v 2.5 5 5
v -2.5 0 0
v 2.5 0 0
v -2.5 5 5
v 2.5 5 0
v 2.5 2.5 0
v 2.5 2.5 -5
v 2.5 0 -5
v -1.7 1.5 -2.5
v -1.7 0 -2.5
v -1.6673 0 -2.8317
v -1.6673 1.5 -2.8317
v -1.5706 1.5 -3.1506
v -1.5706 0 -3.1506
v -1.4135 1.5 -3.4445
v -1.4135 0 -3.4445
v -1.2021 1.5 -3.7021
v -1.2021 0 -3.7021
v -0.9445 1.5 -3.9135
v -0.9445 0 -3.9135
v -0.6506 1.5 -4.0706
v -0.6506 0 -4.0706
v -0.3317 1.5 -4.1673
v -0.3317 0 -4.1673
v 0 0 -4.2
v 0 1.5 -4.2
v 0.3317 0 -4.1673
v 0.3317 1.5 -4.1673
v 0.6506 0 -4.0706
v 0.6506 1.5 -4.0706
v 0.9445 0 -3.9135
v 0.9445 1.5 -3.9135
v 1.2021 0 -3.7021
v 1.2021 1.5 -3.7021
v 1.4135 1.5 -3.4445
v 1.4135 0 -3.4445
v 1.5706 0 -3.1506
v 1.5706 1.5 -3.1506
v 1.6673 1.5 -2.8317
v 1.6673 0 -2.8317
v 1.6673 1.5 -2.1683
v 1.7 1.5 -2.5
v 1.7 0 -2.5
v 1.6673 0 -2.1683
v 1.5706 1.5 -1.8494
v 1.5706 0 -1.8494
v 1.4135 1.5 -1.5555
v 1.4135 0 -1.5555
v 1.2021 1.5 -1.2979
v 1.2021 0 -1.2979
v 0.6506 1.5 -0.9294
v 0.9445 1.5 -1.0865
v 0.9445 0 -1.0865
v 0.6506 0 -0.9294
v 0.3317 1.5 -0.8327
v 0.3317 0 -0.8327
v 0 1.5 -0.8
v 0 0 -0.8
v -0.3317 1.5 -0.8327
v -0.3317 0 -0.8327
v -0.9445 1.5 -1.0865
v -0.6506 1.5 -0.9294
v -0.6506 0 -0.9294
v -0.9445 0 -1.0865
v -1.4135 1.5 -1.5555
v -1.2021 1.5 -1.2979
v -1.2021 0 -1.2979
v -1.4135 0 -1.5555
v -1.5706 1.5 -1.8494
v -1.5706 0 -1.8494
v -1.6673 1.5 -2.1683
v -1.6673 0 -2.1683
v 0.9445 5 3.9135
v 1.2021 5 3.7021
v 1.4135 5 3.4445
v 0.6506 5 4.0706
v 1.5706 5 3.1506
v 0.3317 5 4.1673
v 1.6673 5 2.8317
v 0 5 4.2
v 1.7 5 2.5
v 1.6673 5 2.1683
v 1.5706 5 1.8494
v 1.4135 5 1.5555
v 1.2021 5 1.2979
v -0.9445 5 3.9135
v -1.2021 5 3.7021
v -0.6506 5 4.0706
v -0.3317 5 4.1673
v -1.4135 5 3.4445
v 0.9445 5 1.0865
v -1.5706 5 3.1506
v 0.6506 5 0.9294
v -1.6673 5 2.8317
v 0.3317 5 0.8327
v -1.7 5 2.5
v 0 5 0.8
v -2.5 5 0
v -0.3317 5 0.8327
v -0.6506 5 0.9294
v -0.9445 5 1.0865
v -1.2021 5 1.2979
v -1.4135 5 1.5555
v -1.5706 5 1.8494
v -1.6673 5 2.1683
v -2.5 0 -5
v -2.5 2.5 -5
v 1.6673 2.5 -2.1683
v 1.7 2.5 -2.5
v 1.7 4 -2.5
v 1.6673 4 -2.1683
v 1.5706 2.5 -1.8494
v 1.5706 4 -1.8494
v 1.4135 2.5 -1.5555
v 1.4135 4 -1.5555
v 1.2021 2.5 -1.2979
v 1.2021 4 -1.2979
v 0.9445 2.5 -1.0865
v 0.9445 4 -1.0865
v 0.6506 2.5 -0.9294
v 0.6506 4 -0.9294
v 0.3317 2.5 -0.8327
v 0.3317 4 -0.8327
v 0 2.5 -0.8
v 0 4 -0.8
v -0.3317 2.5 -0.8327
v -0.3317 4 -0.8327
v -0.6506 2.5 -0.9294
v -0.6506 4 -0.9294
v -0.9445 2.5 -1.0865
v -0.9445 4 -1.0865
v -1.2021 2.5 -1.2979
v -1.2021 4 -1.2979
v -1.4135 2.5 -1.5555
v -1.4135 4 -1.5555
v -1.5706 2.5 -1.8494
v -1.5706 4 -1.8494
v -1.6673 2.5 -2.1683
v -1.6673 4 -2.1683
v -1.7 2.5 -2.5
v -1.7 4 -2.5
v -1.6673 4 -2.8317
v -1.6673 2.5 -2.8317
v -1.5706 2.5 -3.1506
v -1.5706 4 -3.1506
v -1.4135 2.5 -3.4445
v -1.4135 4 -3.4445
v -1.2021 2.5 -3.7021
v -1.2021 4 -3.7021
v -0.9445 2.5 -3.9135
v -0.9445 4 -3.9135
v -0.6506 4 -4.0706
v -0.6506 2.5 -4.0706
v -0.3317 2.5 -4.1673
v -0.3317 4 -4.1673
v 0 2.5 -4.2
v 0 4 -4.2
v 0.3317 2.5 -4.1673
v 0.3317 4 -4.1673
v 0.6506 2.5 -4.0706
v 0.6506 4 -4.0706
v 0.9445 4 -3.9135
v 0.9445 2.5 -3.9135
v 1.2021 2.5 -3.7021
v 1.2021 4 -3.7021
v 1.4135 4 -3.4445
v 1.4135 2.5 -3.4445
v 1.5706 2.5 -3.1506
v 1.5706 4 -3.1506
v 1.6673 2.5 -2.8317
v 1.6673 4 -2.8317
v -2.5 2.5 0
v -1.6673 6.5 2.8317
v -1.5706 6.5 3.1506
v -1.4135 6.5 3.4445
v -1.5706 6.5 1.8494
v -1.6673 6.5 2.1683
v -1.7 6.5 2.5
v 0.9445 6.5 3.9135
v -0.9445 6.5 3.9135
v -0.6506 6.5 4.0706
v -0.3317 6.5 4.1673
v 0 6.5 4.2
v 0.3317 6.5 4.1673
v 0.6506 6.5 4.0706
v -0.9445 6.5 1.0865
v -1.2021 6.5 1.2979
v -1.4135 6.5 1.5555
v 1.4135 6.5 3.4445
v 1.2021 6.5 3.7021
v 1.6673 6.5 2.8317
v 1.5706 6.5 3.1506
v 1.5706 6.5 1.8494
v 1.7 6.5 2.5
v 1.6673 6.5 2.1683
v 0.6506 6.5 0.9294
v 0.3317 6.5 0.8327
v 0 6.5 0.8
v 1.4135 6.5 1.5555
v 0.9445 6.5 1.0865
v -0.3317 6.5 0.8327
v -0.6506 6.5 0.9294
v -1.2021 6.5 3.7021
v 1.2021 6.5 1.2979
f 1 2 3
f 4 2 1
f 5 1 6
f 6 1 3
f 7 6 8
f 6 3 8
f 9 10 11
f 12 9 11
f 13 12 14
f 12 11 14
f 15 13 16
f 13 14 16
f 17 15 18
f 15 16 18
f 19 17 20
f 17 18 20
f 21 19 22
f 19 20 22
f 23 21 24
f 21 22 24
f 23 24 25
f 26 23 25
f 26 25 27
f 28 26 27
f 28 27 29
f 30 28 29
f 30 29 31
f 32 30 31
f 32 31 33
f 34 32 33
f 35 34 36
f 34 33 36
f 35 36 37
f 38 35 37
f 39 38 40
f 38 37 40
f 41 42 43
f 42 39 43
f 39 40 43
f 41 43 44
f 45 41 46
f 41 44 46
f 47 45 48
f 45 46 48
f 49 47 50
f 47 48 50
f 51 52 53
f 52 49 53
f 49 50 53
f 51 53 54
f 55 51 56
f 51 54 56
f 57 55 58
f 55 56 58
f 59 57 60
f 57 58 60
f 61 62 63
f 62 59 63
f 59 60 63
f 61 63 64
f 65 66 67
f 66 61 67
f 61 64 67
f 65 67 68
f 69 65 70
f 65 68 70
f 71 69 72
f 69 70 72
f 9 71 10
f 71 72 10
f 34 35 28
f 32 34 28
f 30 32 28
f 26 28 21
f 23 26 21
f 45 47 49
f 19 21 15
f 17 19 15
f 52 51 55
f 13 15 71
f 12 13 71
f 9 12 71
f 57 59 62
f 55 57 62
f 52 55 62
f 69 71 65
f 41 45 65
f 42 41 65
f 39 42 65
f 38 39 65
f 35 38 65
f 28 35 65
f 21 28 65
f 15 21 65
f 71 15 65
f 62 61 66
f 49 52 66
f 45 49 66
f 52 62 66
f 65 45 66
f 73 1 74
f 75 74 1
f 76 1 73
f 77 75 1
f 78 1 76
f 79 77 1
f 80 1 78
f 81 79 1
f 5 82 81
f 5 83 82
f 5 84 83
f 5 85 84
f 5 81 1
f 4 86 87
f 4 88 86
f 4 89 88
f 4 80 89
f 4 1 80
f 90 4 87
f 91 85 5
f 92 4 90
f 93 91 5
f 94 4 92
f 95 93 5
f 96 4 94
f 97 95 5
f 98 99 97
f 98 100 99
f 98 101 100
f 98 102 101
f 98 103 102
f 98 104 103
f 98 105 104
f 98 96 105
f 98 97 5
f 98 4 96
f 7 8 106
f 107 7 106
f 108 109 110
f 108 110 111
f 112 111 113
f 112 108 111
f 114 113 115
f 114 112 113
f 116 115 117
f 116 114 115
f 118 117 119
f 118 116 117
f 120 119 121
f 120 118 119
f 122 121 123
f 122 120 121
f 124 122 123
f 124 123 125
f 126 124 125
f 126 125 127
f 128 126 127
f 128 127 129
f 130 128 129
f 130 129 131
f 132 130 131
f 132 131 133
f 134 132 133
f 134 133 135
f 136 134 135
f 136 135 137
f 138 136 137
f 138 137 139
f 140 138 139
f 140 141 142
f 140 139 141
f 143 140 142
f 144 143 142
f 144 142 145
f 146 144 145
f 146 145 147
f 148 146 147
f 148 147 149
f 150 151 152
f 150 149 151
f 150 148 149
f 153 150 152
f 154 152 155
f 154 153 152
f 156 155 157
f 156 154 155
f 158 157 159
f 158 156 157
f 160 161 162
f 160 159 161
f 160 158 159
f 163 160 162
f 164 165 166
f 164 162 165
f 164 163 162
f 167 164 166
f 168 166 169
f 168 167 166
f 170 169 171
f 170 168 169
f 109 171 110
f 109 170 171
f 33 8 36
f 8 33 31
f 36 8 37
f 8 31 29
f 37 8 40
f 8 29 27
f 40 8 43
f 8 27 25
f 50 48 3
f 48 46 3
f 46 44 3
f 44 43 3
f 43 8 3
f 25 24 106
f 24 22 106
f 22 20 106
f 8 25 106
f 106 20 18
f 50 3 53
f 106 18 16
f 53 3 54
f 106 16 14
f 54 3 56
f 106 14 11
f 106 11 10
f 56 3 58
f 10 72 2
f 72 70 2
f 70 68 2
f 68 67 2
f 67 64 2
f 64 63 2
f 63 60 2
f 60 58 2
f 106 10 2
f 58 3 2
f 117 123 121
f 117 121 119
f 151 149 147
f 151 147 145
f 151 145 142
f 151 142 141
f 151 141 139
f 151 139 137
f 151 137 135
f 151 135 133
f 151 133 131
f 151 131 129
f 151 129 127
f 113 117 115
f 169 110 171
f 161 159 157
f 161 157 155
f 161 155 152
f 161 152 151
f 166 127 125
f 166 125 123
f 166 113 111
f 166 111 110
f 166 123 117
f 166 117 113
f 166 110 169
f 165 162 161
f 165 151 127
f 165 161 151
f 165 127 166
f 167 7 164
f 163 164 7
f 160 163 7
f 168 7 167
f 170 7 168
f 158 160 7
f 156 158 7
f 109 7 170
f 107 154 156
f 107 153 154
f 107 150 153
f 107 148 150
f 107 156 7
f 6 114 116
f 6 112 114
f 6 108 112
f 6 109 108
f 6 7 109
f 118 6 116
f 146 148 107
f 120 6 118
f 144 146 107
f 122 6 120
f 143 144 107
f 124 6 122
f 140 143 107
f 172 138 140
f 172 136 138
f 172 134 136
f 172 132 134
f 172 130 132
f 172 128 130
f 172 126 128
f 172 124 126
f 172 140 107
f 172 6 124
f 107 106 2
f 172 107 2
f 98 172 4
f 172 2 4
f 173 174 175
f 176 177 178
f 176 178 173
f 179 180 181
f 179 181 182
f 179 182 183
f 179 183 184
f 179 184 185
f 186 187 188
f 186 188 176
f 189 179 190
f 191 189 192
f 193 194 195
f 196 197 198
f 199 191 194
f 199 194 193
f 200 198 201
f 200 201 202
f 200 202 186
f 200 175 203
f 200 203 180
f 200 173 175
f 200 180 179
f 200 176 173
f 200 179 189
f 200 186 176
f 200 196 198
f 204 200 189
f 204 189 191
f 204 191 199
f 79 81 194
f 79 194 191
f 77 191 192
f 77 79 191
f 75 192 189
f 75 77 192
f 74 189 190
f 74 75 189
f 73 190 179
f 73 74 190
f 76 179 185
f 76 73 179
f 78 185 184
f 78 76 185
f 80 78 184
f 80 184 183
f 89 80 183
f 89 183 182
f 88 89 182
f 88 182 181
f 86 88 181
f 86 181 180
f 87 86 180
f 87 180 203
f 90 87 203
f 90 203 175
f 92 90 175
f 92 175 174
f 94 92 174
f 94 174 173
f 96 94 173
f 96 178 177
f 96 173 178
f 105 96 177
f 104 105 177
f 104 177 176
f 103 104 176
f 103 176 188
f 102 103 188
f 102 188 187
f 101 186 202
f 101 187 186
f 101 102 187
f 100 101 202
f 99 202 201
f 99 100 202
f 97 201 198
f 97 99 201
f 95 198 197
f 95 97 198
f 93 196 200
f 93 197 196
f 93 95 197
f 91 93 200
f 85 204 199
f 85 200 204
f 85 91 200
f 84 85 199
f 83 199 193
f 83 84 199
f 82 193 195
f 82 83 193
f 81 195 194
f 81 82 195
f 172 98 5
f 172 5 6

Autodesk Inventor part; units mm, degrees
ref_plane "YZ Plane" through (0, 0, 0) normal (1, 0, 0) x (0, 1, 0)
ref_plane "XZ Plane" through (0, 0, 0) normal (0, 1, 0) x (-1, 0, 0)
ref_plane "XY Plane" through (0, 0, 0) normal (0, 0, 1) x (1, 0, 0)
sketch "草圖1" plane through (0, 0, 0) normal (0, 1, 0) x (-1, 0, 0)
  line L0 (2.5, 5) -> (-2.5, 5)
  line L1 (-2.5, 5) -> (-2.5, -5)
  line L2 (-2.5, -5) -> (2.5, -5)
  line L3 (2.5, -5) -> (2.5, 5)
  circle A0 centre (0, 2.5) radius 1.7
  circle A1 centre (0, -2.5) radius 1.7
  line L4 (2.5, 0) -> (-2.5, 0)
  point P0 (0, 0)
  point P1 (0, -5)
  dimension "d0" = 5
  dimension "d1" = 10
  dimension "d2" = 3.4
  dimension "d3" = 3.4
  dimension "d4" = 2.5
  dimension "d5" = 2.5
  dimension "d6" = 2.5
  dimension "d7" = 2.5
extrude "擠出1" add sketch "草圖1" along normal blind 2.5 contours L3 L2 L1 L4 | A1
extrude "擠出2" cut sketch "草圖1" along normal blind 1.5 contours A1
sketch "草圖2" plane through (0, 2.5, 0) normal (0, 1, 0) x (1, 0, 0)
  circle A0 centre (0, 2.5) radius 1.7 projected
  point P0 (0, 0)
extrude "擠出3" add sketch "草圖2" along normal blind 1.5
sketch "草圖3" plane through (0, 0, 0) normal (1, 0, 0) x (0, 1, 0)
  line L0 (0, 5) -> (0, -5) projected
  line L1 (0, 0) -> (5, 5)
  line L2 (5, 5) -> (5, 0)
  line L3 (5, 0) -> (0, 0)
  dimension "d15" = 5
  dimension "d20" = 5
extrude "擠出4" add sketch "草圖3" along normal mid plane 5
sketch "草圖4" plane through (-2.5, 5, 5) normal (0, 1, 0) x (1, 0, 0)
  circle A0 centre (2.5, 2.5) radius 1.7 projected
  point P0 (2.5, 5)
extrude "擠出5" add sketch "草圖4" along normal blind 1.5
properties part number "110033226_ipt_11_樓梯支架"
